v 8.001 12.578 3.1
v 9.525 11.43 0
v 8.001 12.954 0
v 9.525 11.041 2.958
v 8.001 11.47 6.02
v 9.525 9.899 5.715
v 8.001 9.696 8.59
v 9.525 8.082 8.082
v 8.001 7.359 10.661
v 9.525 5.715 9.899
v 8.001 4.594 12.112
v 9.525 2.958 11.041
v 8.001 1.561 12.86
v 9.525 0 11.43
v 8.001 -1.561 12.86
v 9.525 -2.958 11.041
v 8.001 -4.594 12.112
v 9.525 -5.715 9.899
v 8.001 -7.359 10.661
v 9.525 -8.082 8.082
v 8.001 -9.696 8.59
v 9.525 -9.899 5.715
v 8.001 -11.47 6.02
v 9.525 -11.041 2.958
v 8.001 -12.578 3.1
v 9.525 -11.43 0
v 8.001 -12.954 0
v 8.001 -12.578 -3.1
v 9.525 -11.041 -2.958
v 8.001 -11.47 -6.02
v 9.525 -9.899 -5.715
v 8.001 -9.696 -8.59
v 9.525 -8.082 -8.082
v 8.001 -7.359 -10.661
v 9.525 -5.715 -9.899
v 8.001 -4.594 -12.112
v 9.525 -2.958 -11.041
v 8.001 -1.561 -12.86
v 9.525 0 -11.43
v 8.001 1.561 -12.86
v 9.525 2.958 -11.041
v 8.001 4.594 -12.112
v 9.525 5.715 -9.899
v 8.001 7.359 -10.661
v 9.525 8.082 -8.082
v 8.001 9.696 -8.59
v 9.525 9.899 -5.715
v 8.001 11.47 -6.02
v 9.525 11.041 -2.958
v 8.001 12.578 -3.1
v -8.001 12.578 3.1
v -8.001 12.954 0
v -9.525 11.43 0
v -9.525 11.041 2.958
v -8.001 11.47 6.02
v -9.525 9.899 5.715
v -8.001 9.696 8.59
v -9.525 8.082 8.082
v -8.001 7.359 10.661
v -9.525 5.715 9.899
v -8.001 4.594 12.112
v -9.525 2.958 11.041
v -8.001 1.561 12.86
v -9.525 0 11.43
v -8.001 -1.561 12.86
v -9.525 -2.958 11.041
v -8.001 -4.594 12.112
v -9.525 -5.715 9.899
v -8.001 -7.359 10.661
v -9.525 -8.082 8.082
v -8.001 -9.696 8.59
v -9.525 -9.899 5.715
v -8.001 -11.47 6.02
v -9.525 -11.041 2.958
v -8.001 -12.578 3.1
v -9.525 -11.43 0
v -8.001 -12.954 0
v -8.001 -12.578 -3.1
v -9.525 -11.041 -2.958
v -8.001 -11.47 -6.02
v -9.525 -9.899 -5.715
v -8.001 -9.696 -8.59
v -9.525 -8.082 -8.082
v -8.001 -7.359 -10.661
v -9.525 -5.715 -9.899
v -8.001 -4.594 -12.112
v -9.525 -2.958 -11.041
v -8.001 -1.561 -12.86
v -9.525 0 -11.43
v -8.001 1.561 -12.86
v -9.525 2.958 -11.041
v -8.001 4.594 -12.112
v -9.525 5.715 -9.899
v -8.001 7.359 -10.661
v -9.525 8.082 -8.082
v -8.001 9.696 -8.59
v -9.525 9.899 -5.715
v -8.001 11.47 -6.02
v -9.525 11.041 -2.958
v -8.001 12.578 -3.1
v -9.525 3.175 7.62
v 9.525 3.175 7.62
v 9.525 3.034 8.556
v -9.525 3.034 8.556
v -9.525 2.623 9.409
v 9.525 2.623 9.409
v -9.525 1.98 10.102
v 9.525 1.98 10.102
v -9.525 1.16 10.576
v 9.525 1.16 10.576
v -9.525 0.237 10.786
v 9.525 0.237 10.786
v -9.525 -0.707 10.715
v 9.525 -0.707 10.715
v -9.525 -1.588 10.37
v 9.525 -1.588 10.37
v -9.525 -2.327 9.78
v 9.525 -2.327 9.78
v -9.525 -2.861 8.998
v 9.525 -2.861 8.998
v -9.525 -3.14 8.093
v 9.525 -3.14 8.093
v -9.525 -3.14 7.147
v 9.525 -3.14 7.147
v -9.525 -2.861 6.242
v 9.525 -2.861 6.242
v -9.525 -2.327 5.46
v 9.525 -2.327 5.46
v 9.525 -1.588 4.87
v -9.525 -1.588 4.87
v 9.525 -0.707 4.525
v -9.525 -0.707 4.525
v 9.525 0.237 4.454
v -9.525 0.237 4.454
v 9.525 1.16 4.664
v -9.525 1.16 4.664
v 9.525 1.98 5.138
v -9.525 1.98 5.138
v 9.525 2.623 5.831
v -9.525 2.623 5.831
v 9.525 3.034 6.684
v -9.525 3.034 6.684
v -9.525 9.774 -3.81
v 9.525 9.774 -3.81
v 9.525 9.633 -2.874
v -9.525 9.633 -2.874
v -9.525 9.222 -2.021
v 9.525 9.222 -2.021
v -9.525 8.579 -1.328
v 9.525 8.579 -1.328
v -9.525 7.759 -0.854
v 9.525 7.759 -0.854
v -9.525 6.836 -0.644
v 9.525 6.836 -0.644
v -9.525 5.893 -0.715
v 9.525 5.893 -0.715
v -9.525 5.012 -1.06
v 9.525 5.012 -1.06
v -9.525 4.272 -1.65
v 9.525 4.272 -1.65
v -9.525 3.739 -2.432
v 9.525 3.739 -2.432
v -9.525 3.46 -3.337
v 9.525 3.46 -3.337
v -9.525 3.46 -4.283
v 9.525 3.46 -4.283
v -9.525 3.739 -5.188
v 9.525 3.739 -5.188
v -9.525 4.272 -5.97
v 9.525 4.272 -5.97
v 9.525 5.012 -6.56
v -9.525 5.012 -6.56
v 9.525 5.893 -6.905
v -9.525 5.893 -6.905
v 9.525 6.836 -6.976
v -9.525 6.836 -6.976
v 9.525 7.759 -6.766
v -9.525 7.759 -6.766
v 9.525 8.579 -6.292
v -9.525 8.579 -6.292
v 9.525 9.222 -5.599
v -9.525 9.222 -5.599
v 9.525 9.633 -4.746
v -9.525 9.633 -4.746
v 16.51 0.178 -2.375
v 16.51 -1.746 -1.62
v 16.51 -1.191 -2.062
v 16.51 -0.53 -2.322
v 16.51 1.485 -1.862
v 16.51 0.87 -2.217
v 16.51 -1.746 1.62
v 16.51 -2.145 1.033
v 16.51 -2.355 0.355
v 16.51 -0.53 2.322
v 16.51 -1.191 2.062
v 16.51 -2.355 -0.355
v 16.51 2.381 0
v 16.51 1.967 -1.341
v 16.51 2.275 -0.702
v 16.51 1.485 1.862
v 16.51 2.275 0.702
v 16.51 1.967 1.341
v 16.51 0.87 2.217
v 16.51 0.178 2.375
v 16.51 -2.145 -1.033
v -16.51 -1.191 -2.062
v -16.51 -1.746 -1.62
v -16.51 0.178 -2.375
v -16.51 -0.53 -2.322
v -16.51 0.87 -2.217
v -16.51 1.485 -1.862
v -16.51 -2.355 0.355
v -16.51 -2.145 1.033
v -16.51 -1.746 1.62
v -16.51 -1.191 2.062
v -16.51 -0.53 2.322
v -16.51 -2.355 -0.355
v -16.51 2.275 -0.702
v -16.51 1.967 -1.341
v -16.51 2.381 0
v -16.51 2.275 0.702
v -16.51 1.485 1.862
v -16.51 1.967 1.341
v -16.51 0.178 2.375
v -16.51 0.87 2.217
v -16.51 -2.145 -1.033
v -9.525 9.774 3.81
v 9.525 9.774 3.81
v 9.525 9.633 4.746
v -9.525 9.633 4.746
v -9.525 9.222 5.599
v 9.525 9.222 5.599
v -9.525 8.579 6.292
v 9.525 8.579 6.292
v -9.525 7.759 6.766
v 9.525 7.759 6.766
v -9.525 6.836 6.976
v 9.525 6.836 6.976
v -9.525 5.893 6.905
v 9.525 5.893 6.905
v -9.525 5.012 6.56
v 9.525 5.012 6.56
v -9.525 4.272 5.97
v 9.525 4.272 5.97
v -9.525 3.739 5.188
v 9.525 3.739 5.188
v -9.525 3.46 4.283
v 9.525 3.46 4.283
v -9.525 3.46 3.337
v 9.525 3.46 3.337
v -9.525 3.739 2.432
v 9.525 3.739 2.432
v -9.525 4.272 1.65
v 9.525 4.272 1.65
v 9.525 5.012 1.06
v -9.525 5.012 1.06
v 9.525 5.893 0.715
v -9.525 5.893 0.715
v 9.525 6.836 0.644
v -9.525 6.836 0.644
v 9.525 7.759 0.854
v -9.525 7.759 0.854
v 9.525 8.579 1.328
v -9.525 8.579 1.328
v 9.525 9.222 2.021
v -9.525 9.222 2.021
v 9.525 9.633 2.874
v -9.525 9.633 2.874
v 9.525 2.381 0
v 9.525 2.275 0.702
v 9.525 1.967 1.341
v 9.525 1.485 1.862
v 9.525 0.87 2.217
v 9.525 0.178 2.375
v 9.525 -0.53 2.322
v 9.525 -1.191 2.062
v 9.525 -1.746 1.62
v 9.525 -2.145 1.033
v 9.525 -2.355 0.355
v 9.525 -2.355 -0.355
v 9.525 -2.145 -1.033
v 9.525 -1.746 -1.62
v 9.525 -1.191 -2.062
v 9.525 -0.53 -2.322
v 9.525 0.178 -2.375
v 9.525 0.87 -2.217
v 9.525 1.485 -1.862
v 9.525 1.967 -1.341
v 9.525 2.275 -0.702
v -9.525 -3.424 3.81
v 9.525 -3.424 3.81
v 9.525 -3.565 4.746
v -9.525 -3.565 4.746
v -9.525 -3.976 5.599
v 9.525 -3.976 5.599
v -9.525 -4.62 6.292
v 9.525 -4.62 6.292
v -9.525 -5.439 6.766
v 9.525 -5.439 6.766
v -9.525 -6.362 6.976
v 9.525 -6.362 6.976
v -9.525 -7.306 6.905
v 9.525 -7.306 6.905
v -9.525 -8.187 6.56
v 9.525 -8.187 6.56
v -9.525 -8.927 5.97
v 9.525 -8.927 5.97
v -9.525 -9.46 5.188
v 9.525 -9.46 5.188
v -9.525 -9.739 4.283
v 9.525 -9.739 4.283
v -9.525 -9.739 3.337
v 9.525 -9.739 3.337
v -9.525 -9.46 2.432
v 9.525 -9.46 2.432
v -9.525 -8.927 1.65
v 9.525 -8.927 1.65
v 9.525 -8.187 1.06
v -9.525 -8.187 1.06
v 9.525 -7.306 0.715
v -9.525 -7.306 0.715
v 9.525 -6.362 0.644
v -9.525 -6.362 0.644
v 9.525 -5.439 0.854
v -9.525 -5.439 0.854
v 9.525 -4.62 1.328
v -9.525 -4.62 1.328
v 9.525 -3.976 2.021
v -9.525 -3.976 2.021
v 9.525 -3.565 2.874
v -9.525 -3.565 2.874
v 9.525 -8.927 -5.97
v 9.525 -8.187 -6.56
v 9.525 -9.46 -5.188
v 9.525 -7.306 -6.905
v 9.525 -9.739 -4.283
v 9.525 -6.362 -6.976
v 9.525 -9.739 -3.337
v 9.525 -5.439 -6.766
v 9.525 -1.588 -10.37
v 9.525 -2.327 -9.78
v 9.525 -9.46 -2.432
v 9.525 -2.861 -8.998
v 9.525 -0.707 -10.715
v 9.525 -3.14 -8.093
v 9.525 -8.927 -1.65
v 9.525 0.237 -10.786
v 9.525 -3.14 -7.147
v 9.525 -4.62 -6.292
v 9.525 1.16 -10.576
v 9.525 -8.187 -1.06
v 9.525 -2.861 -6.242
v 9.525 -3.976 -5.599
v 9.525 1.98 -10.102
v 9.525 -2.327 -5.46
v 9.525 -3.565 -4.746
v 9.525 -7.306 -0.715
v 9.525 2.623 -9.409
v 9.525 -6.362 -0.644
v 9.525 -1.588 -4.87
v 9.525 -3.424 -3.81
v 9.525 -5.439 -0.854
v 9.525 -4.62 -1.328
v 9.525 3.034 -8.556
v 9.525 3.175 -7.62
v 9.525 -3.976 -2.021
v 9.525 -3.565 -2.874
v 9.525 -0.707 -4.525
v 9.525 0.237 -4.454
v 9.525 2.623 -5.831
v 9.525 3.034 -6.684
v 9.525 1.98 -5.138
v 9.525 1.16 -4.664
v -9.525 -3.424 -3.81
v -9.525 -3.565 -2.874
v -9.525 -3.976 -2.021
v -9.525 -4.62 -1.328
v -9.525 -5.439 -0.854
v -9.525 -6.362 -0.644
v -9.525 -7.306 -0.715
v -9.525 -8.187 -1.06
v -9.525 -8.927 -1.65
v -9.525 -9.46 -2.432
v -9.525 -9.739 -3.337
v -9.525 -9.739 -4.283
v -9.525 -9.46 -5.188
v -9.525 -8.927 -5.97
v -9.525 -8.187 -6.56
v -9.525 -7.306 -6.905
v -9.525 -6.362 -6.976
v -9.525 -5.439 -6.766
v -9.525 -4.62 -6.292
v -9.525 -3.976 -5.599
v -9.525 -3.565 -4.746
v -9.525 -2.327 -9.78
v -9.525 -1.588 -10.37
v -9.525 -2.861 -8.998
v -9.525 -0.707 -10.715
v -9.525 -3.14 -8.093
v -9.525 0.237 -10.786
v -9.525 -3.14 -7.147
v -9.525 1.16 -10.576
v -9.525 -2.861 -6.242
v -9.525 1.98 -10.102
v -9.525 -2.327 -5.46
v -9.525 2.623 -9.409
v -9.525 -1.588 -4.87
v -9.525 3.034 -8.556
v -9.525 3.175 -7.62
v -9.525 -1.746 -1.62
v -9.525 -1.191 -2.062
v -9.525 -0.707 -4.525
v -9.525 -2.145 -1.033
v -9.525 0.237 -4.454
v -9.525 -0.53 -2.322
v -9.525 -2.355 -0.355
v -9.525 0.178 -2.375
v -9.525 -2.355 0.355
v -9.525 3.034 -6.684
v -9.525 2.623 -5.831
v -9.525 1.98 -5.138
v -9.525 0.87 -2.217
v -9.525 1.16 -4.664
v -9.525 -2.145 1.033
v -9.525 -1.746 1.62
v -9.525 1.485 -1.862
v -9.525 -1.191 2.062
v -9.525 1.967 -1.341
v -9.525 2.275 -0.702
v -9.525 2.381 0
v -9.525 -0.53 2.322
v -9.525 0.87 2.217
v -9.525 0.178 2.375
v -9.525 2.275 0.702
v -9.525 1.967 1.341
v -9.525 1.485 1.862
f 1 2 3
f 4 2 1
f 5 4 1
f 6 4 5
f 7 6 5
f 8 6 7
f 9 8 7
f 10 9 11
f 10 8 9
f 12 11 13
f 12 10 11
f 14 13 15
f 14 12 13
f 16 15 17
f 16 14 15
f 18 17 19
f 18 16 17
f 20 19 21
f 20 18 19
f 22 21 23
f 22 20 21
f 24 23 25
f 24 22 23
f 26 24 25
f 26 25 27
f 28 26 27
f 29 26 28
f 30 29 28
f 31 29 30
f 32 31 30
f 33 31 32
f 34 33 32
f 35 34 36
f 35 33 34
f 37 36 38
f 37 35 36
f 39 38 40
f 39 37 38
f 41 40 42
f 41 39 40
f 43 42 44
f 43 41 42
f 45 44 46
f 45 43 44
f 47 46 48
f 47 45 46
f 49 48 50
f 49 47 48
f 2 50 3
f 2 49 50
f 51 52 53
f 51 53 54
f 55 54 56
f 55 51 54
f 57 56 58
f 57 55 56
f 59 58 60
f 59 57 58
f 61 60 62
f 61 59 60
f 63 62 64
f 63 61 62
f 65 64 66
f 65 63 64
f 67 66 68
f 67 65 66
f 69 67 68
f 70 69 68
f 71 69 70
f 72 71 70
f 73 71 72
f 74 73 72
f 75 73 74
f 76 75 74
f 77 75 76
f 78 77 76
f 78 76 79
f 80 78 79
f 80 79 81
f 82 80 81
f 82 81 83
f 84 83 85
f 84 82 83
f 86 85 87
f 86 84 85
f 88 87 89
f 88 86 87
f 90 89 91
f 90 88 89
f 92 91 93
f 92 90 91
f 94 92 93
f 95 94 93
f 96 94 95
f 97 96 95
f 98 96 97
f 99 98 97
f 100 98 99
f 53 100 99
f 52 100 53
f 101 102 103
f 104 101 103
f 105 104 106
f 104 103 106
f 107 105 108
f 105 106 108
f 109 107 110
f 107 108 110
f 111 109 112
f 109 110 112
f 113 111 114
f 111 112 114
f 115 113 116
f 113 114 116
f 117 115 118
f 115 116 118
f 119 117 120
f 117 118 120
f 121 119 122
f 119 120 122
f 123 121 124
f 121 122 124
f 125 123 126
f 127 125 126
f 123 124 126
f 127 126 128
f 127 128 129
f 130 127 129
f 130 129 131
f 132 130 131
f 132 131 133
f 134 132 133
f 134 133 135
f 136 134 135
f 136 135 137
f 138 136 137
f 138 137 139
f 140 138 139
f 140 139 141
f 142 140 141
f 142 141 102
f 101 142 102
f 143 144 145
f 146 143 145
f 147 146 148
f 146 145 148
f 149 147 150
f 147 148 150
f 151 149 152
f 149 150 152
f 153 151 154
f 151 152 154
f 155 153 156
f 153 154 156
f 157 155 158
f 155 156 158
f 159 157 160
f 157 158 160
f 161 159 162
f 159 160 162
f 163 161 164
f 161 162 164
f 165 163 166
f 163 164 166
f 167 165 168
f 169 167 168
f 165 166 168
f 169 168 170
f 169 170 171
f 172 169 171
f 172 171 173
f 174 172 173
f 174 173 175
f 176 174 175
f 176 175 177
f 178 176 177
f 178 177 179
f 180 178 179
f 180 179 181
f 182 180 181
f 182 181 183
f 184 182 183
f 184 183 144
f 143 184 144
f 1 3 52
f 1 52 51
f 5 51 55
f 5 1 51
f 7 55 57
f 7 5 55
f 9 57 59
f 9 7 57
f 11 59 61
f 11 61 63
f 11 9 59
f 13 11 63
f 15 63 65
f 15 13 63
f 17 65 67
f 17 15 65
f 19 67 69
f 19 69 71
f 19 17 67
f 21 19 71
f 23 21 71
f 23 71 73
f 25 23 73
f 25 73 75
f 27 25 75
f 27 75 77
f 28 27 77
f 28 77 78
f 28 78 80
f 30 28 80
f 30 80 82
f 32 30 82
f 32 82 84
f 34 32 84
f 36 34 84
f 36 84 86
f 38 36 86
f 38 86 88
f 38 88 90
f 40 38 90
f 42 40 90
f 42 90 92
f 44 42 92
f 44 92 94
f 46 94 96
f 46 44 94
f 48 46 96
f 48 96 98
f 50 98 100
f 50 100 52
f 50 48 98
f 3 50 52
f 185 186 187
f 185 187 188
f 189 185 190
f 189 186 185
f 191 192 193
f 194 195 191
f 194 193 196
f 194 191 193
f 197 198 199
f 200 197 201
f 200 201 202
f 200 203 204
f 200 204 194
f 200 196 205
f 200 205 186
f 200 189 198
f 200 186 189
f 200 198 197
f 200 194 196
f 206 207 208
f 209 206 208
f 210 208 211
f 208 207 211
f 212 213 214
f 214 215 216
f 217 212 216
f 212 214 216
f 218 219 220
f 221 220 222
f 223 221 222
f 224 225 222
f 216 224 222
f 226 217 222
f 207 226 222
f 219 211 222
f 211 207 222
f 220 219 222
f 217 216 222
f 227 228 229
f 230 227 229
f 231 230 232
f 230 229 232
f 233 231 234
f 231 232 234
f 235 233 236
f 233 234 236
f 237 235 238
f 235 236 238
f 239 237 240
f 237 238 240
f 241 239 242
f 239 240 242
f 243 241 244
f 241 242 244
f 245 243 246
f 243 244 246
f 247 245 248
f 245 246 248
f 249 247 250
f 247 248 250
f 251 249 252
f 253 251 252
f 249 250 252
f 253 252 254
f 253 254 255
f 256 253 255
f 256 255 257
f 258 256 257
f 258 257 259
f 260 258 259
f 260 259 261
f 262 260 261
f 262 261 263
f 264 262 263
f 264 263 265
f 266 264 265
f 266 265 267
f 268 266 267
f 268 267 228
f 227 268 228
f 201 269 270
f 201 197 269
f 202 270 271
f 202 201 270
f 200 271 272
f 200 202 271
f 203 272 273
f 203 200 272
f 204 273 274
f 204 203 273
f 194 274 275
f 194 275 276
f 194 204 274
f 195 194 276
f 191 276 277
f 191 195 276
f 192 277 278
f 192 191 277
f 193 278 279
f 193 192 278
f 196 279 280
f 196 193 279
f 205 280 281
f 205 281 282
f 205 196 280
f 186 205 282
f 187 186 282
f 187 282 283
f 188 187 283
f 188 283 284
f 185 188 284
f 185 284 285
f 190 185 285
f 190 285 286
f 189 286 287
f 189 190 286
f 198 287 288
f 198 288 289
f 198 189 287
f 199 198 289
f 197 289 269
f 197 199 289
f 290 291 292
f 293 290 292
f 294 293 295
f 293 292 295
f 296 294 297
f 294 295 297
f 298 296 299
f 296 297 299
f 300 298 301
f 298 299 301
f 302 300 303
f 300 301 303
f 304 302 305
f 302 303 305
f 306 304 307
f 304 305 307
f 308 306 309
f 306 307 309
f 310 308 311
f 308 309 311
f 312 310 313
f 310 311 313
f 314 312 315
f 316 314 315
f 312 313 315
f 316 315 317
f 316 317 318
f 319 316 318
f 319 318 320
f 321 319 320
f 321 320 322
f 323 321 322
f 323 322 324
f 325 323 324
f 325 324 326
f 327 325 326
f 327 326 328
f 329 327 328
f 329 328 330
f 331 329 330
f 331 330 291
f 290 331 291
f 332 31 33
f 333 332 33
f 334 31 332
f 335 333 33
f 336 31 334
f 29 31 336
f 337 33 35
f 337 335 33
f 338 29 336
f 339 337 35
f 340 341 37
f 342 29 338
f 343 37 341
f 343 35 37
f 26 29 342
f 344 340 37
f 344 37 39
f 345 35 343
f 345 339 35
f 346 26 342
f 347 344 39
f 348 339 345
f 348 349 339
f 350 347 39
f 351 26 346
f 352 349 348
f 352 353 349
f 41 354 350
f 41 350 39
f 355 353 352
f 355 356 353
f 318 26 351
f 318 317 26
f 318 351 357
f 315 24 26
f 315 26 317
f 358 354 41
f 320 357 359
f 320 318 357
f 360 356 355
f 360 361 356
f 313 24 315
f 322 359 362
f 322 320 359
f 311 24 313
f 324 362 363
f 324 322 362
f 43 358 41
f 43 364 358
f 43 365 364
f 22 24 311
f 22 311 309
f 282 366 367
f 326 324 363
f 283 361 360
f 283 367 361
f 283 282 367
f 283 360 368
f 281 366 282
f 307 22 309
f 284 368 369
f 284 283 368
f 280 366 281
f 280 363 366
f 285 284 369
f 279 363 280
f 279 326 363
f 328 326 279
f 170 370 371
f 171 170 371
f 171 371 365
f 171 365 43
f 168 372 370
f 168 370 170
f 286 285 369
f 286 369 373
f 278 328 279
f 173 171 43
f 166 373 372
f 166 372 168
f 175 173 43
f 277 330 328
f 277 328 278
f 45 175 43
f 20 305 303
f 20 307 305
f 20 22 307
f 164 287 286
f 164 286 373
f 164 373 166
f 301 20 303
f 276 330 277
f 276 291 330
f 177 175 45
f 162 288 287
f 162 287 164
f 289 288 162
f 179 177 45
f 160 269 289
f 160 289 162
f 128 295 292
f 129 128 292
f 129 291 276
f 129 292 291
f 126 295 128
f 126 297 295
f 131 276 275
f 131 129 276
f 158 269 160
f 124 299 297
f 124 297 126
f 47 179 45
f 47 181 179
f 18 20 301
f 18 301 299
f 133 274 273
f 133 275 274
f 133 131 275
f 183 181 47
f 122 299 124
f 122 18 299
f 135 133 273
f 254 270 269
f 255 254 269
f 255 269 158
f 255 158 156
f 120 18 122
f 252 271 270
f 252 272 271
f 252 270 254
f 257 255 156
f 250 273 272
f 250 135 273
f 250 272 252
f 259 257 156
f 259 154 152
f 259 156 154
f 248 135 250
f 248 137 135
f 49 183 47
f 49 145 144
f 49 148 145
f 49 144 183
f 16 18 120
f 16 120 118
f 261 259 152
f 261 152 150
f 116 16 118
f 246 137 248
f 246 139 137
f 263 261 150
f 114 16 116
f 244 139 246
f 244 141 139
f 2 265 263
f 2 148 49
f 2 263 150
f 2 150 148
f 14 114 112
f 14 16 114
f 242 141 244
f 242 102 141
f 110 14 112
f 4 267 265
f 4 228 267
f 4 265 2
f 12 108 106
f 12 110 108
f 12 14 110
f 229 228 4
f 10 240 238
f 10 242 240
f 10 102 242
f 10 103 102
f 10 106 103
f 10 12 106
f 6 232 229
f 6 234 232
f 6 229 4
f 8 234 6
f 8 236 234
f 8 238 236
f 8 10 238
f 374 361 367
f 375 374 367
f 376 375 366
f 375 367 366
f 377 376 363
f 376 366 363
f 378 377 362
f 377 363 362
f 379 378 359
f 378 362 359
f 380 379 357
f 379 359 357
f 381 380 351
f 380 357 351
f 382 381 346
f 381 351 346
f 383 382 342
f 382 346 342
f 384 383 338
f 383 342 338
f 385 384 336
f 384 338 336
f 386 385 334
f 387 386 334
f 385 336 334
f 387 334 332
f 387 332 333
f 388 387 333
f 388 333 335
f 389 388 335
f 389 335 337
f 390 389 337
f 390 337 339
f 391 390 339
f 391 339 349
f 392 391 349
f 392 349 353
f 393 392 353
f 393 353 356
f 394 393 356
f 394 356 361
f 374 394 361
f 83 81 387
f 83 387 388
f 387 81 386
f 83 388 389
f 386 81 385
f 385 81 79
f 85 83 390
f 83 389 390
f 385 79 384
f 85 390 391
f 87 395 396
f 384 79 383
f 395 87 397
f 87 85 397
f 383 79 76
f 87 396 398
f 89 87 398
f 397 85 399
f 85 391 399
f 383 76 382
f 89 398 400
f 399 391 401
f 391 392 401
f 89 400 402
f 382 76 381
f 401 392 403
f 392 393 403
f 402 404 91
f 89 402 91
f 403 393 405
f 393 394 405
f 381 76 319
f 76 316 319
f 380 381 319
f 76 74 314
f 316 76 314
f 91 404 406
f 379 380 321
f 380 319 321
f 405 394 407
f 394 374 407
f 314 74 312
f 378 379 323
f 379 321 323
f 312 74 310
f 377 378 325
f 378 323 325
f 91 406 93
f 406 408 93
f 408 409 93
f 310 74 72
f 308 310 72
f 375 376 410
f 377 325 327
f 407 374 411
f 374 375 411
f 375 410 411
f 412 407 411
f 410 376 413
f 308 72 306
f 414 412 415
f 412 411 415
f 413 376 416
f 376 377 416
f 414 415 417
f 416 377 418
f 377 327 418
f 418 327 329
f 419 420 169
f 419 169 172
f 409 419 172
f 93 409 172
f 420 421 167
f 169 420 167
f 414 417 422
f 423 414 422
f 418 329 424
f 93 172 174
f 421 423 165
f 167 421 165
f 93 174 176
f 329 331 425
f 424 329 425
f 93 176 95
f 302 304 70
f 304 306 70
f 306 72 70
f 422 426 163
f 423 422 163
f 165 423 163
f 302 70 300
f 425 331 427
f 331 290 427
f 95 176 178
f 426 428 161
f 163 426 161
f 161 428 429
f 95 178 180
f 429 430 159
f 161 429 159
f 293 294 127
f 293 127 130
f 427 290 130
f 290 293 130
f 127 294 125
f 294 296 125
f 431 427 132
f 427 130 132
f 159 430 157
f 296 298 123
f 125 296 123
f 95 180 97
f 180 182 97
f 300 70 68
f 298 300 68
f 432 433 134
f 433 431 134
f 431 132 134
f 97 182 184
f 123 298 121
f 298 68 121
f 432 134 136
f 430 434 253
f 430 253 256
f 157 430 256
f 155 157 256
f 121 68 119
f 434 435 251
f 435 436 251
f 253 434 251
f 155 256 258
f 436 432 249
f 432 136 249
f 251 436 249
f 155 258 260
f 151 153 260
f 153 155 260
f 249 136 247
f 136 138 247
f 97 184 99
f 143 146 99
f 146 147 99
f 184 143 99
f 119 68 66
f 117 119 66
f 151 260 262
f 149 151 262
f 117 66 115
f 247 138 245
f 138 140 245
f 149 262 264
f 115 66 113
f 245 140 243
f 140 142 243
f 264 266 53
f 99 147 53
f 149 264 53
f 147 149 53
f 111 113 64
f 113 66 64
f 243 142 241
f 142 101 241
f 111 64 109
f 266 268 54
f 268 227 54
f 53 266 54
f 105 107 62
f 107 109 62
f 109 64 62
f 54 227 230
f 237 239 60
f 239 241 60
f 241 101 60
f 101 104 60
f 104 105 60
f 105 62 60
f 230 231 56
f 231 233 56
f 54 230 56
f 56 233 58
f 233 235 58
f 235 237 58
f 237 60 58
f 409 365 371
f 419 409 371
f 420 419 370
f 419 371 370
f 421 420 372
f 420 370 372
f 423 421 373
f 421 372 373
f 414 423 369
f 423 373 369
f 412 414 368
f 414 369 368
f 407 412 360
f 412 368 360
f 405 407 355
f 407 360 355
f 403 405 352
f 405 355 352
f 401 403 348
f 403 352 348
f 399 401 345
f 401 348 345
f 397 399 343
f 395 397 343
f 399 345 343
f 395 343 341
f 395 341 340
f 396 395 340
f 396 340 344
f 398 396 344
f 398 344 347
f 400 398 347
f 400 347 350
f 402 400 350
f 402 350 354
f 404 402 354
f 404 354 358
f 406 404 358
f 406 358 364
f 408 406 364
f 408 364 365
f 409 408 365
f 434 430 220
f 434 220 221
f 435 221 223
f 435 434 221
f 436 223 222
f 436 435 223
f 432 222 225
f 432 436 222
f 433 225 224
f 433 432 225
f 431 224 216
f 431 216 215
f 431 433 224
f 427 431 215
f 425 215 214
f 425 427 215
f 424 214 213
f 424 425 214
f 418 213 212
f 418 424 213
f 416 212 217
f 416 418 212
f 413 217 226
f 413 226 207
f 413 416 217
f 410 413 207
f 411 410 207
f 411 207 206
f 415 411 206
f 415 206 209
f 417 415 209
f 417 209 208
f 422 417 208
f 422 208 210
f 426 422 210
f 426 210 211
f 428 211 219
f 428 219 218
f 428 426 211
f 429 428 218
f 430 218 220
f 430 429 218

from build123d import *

# Parameters (mm, degrees)
F0_R     = 12.954
F0_R_2   = 2.38125
F1_DEPTH = 9.525
F2_DEPTH = 16.51
F3_R     = 3.175
F4_DEPTH = 26.036
F5_SIZE  = 1.524


with BuildPart() as f1:
    # F0 (on Right) → F1 (new body, symmetric)
    with BuildSketch(Plane.YZ):
        Circle(F0_R)
        Circle(F0_R_2, mode=Mode.SUBTRACT)
    extrude(amount=F1_DEPTH, both=True)

    # F0 (on Right) → F2 (join, symmetric)
    with BuildSketch(Plane.YZ):
        Circle(F0_R_2)
    extrude(amount=F2_DEPTH, both=True)

    # F3 (on face) → F4 (cut, through all)
    with BuildSketch(Plane.YZ.offset(9.525)):
        with Locations((0, 7.62)):
            Circle(F3_R)
        with Locations((-6.5991135768, 3.81)):
            Circle(F3_R)
        with Locations((-6.5991135768, -3.81)):
            Circle(F3_R)
        with Locations((0, -7.62)):
            Circle(F3_R)
        with Locations((6.5991135768, -3.81)):
            Circle(F3_R)
        with Locations((6.5991135768, 3.81)):
            Circle(F3_R)
    extrude(amount=-F4_DEPTH, mode=Mode.SUBTRACT)

    # F5
    f5_edges = [f1.edges().sort_by_distance(p)[0] for p in [
        (9.525, -12.954, 0),
        (-9.525, -12.954, 0),
    ]]
    chamfer(f5_edges, length=F5_SIZE)


solid = f1.part
